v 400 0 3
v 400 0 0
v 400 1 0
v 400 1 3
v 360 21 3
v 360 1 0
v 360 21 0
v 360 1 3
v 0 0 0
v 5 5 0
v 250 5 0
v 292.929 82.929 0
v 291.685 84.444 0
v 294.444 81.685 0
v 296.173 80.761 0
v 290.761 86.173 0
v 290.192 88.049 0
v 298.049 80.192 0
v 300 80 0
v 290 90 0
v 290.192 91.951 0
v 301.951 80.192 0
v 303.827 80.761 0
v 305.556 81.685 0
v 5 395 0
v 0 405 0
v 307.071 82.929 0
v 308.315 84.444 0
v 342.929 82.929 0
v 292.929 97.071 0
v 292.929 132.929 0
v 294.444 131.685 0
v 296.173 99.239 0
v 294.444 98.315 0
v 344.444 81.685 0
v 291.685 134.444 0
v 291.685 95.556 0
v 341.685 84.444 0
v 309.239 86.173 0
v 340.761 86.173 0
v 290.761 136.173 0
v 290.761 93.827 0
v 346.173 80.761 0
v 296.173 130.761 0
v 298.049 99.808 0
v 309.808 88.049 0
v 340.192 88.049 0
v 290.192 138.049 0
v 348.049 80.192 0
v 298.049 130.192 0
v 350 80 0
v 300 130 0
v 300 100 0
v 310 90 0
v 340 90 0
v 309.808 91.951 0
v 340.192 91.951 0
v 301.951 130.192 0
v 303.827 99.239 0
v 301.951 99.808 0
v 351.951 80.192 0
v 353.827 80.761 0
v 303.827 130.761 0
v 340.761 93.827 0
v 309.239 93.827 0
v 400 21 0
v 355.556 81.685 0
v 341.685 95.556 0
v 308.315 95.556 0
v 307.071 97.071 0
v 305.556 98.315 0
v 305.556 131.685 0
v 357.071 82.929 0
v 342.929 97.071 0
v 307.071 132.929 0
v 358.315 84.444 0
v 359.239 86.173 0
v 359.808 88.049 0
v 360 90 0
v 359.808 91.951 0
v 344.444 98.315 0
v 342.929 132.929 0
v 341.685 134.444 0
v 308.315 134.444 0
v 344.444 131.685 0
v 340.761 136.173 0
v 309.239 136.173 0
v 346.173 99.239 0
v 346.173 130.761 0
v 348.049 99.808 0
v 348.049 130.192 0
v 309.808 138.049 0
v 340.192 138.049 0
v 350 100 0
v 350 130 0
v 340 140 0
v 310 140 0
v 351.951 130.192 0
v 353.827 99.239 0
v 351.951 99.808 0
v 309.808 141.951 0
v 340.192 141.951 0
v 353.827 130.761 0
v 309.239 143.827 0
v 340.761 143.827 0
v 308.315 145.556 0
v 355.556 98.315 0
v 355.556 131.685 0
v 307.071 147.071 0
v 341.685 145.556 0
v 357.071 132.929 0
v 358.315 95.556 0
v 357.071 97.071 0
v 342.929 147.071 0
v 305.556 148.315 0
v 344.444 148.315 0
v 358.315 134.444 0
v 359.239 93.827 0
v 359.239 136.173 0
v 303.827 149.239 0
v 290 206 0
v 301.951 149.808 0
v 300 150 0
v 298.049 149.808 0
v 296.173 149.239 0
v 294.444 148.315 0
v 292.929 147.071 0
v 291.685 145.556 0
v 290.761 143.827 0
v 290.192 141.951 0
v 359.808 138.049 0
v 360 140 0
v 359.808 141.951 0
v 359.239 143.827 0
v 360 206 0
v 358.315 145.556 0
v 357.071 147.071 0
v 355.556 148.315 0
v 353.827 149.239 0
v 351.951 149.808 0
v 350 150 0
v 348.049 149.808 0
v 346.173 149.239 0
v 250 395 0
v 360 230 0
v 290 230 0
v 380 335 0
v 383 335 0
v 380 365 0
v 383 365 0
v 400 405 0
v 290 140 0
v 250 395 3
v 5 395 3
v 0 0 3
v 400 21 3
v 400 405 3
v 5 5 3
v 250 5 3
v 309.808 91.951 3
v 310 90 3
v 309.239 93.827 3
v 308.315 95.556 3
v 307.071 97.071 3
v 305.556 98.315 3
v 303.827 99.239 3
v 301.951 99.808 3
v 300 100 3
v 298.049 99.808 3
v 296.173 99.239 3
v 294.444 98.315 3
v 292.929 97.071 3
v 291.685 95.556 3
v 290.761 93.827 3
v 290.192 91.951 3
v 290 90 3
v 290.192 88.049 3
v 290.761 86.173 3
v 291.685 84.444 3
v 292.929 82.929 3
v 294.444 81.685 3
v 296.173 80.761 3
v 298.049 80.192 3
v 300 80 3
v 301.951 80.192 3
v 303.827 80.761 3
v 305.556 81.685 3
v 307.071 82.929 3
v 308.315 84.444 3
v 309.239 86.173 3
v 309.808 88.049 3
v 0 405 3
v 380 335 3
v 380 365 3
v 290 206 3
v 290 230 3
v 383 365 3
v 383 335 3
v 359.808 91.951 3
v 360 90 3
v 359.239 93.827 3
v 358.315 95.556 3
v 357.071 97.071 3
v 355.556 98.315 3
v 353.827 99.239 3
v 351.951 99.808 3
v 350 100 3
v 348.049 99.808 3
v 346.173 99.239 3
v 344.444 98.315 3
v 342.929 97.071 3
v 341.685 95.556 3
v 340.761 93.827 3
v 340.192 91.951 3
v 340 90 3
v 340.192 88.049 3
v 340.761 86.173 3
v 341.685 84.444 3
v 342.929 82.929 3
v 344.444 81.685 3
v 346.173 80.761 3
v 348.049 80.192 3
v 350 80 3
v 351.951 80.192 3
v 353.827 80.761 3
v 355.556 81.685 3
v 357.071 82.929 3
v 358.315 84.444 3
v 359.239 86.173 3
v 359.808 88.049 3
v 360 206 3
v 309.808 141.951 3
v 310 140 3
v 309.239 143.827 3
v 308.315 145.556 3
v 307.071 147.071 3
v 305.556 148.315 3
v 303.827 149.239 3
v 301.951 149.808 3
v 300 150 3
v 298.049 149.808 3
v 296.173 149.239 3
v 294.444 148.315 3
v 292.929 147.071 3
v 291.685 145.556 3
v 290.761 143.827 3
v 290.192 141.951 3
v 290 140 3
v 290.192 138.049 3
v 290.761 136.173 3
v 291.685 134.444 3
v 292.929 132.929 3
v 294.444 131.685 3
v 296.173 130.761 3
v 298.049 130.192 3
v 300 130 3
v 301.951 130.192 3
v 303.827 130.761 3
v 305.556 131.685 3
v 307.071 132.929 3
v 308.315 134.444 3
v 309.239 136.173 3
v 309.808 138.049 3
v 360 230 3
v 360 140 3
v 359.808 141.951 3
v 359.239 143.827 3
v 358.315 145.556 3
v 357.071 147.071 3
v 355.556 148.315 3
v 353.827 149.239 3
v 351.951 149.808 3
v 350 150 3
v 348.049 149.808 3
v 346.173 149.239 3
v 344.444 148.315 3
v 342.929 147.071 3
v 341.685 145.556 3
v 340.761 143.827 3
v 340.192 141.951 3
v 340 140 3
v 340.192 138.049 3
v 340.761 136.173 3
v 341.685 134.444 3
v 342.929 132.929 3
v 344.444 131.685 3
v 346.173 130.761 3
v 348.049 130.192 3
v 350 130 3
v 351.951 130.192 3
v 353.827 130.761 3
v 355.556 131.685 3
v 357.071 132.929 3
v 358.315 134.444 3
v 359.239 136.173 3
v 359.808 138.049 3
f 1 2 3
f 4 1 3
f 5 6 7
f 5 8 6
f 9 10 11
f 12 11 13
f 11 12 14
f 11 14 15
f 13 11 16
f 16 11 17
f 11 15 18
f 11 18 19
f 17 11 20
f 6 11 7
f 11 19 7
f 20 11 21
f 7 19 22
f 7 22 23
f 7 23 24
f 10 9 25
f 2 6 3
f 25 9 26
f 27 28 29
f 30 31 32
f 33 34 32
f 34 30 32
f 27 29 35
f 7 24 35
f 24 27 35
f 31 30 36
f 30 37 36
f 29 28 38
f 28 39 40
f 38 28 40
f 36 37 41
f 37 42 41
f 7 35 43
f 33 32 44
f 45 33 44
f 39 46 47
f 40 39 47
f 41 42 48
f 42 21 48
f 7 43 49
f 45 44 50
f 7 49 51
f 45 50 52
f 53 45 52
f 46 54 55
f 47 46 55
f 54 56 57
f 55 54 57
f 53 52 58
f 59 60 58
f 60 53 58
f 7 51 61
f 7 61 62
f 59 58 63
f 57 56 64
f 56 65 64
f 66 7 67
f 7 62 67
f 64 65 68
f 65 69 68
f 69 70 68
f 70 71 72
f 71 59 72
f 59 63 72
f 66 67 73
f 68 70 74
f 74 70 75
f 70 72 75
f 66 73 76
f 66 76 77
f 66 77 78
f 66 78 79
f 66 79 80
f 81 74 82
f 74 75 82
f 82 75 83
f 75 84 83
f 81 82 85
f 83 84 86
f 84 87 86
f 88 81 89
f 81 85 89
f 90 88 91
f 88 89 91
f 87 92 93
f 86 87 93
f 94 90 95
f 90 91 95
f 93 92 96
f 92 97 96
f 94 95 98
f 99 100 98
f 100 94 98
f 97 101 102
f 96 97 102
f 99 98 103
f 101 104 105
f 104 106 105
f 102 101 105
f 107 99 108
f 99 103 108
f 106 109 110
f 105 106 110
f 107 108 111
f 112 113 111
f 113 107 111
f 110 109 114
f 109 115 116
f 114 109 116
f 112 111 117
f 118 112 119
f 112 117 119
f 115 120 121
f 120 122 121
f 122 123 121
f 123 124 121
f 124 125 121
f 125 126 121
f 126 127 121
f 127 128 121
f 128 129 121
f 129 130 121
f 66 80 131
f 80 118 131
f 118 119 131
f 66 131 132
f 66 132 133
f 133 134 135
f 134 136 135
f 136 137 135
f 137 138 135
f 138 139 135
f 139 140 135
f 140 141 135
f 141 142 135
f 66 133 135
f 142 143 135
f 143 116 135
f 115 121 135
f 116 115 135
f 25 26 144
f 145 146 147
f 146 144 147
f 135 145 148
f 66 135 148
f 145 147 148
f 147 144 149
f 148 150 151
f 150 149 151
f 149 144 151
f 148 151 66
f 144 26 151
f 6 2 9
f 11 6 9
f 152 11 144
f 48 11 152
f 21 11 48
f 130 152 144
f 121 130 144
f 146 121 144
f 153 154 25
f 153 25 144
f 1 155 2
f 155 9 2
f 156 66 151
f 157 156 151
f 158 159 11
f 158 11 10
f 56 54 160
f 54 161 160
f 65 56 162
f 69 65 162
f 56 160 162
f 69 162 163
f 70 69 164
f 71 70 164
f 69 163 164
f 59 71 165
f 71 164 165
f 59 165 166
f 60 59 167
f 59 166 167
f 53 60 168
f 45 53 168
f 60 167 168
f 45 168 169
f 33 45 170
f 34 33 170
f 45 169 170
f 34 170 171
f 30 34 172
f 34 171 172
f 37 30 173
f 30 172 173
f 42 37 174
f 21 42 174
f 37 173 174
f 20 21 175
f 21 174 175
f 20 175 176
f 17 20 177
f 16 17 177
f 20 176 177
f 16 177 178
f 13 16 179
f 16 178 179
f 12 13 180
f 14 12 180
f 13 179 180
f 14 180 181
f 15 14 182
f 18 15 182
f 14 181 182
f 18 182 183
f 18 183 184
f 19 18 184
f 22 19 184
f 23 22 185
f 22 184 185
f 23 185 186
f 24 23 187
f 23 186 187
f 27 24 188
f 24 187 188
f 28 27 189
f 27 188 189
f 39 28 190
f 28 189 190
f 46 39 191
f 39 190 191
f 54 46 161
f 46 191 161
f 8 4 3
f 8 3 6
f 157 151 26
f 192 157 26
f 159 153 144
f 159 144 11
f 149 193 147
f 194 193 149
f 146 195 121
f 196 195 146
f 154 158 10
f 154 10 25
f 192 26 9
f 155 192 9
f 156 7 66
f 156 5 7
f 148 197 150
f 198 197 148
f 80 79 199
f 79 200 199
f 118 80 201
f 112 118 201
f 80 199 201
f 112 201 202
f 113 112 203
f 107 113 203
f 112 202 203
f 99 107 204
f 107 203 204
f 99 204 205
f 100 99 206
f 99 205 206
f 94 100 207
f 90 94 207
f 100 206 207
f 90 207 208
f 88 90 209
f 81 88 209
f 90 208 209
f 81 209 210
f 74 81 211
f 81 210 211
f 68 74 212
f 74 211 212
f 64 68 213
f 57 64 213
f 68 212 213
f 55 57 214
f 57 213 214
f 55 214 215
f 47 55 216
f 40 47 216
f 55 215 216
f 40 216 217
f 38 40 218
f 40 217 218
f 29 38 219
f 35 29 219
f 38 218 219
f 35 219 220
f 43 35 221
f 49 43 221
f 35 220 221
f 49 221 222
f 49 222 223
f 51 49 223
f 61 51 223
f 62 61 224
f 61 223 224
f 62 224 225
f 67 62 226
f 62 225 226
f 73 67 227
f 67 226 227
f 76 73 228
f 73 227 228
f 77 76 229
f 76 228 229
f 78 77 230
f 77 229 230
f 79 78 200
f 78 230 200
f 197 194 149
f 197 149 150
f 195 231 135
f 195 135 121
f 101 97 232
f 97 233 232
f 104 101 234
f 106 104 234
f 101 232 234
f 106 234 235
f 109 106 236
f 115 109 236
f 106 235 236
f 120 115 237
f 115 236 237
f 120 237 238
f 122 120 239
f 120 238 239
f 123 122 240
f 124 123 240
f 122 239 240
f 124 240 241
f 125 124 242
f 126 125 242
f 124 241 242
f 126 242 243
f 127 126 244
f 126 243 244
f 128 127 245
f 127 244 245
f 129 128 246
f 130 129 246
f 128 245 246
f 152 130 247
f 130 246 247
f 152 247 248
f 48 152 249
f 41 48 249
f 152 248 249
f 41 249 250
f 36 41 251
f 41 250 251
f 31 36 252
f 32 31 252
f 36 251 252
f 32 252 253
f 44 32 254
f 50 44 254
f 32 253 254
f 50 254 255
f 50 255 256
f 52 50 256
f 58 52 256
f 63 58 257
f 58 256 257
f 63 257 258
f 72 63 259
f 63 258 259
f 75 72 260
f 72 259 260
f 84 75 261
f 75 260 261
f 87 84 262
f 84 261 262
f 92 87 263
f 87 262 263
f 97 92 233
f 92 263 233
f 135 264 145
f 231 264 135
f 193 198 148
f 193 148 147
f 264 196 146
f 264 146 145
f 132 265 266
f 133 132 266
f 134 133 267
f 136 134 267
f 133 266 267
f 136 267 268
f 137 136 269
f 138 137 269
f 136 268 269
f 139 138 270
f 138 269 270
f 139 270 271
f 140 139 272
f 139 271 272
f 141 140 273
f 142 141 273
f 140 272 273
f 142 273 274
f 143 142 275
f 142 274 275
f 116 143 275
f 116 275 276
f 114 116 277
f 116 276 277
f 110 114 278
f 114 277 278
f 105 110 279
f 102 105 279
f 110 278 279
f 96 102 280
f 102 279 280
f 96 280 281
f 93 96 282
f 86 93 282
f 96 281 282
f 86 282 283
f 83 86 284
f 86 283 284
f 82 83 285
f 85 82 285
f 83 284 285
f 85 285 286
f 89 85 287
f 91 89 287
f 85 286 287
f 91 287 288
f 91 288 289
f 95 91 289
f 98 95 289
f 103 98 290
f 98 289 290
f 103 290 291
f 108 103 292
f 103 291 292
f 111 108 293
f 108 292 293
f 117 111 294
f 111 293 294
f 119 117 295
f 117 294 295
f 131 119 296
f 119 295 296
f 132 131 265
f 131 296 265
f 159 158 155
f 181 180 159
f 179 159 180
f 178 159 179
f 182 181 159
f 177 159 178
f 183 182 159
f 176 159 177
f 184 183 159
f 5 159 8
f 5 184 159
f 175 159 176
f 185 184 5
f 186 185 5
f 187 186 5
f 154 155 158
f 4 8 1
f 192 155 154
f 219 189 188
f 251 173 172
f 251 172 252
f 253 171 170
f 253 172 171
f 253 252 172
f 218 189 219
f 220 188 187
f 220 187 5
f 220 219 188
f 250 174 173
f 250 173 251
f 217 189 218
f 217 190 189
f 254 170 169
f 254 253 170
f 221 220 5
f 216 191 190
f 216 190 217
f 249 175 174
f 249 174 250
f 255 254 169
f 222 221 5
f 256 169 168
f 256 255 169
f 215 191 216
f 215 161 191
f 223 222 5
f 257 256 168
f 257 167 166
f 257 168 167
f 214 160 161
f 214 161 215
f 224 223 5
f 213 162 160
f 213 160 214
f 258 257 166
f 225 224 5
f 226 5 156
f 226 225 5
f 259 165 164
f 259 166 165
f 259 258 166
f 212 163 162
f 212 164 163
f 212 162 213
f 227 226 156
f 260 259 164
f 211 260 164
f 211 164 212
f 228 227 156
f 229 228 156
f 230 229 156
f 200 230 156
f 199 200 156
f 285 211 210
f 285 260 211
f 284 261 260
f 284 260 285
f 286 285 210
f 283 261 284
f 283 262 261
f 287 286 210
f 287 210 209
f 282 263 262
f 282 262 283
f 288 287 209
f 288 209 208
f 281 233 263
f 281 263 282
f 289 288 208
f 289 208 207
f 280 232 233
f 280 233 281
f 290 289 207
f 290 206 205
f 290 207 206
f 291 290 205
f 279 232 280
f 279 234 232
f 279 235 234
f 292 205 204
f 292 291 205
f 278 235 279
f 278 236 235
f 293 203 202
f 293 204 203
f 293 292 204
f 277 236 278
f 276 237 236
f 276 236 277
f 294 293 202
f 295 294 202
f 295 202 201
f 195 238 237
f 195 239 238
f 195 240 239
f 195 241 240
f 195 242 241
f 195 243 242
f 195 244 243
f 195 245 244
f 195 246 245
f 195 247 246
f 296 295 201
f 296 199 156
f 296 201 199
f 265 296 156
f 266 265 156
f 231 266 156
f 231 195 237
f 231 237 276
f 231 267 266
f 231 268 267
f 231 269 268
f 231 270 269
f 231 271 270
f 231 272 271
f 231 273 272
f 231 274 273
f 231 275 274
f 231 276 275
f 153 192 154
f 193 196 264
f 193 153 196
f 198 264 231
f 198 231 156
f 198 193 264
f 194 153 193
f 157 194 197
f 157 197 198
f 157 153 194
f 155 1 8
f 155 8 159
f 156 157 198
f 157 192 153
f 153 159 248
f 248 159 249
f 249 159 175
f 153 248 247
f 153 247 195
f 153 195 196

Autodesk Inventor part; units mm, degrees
ref_plane "YZ Plane" through (0, 0, 0) normal (1, 0, 0) x (0, 1, 0)
ref_plane "XZ Plane" through (0, 0, 0) normal (0, 1, 0) x (-1, 0, 0)
ref_plane "XY Plane" through (0, 0, 0) normal (0, 0, 1) x (1, 0, 0)
sketch "Esquisse1" plane through (0, 0, 0) normal (0, 0, 1) x (1, 0, 0)
  line L0 (0, 0) -> (400, 0)
  line L1 (400, 0) -> (400, 405)
  line L2 (400, 405) -> (0, 405)
  line L3 (0, 405) -> (0, 0)
  dimension "d0" = 400
  dimension "d1" = 405
extrude "Extrusion1" add sketch "Esquisse1" along normal blind 3
sketch "Esquisse2" plane through (0, 0, 3) normal (0, 0, 1) x (1, 0, 0)
  line L0 (5, 395) -> (250, 395)
  line L1 (250, 395) -> (250, 5)
  line L2 (250, 5) -> (5, 5)
  line L3 (5, 5) -> (5, 395)
  line L4 (0, 0) -> (400, 0) projected
  line L5 (0, 405) -> (0, 0) projected
  dimension "d4" = 390
  dimension "d5" = 5
  dimension "d6" = 5
  dimension "d7" = 245
extrude "Extrusion2" cut sketch "Esquisse2" against normal blind 3
sketch "Esquisse3" plane through (0, 0, 3) normal (0, 0, 1) x (1, 0, 0)
  line L0 (290, 230) -> (360, 230)
  line L1 (360, 230) -> (360, 206)
  line L2 (360, 206) -> (290, 206)
  line L3 (290, 206) -> (290, 230)
  line L4 (250, 395) -> (250, 5) projected
  line L5 (400, 405) -> (0, 405) projected
  circle A0 centre (300, 140) radius 10
  circle A1 centre (350, 140) radius 10
  circle A2 centre (300, 90) radius 10
  circle A3 centre (350, 90) radius 10
  line L6 (0, 0) -> (400, 0) projected
  dimension "d10" = 24
  dimension "d11" = 70
  dimension "d13" = 40
  dimension "d14" = 175
  dimension "d17" = 20
  dimension "d18" = 20
  dimension "d19" = 20
  dimension "d20" = 20
  dimension "d21" = 50
  dimension "d22" = 100
  dimension "d23" = 140
  dimension "d24" = 140
  dimension "d25" = 50
  dimension "d26" = 90
  dimension "d27" = 90
  dimension "d28" = 100
extrude "Extrusion3" cut sketch "Esquisse3" against normal blind 3
sketch "Esquisse4" plane through (0, 0, 3) normal (0, 0, 1) x (1, 0, 0)
  line L0 (380, 365) -> (383, 365)
  line L1 (383, 365) -> (383, 335)
  line L2 (383, 335) -> (380, 335)
  line L3 (380, 335) -> (380, 365)
  line L4 (250, 395) -> (250, 5) projected
  line L5 (400, 405) -> (0, 405) projected
  point P0 (0, 0)
  dimension "d29" = 30
  dimension "d30" = 3
  dimension "d31" = 130
  dimension "d32" = 40
extrude "Extrusion4" cut sketch "Esquisse4" against normal blind 3
sketch "Esquisse5" plane through (0, 0, 3) normal (0, 0, 1) x (1, 0, 0)
  line L0 (360, 21) -> (400, 21)
  line L1 (400, 21) -> (400, 1)
  line L2 (400, 1) -> (360, 1)
  line L3 (360, 1) -> (360, 21)
  line L4 (400, 0) -> (400, 405) projected
  line L5 (0, 0) -> (400, 0) projected
  dimension "d35" = 40
  dimension "d36" = 0
  dimension "d37" = 1
  dimension "d38" = 20
extrude "Extrusion5" cut sketch "Esquisse5" against normal blind 3
properties part number "face-avant"
